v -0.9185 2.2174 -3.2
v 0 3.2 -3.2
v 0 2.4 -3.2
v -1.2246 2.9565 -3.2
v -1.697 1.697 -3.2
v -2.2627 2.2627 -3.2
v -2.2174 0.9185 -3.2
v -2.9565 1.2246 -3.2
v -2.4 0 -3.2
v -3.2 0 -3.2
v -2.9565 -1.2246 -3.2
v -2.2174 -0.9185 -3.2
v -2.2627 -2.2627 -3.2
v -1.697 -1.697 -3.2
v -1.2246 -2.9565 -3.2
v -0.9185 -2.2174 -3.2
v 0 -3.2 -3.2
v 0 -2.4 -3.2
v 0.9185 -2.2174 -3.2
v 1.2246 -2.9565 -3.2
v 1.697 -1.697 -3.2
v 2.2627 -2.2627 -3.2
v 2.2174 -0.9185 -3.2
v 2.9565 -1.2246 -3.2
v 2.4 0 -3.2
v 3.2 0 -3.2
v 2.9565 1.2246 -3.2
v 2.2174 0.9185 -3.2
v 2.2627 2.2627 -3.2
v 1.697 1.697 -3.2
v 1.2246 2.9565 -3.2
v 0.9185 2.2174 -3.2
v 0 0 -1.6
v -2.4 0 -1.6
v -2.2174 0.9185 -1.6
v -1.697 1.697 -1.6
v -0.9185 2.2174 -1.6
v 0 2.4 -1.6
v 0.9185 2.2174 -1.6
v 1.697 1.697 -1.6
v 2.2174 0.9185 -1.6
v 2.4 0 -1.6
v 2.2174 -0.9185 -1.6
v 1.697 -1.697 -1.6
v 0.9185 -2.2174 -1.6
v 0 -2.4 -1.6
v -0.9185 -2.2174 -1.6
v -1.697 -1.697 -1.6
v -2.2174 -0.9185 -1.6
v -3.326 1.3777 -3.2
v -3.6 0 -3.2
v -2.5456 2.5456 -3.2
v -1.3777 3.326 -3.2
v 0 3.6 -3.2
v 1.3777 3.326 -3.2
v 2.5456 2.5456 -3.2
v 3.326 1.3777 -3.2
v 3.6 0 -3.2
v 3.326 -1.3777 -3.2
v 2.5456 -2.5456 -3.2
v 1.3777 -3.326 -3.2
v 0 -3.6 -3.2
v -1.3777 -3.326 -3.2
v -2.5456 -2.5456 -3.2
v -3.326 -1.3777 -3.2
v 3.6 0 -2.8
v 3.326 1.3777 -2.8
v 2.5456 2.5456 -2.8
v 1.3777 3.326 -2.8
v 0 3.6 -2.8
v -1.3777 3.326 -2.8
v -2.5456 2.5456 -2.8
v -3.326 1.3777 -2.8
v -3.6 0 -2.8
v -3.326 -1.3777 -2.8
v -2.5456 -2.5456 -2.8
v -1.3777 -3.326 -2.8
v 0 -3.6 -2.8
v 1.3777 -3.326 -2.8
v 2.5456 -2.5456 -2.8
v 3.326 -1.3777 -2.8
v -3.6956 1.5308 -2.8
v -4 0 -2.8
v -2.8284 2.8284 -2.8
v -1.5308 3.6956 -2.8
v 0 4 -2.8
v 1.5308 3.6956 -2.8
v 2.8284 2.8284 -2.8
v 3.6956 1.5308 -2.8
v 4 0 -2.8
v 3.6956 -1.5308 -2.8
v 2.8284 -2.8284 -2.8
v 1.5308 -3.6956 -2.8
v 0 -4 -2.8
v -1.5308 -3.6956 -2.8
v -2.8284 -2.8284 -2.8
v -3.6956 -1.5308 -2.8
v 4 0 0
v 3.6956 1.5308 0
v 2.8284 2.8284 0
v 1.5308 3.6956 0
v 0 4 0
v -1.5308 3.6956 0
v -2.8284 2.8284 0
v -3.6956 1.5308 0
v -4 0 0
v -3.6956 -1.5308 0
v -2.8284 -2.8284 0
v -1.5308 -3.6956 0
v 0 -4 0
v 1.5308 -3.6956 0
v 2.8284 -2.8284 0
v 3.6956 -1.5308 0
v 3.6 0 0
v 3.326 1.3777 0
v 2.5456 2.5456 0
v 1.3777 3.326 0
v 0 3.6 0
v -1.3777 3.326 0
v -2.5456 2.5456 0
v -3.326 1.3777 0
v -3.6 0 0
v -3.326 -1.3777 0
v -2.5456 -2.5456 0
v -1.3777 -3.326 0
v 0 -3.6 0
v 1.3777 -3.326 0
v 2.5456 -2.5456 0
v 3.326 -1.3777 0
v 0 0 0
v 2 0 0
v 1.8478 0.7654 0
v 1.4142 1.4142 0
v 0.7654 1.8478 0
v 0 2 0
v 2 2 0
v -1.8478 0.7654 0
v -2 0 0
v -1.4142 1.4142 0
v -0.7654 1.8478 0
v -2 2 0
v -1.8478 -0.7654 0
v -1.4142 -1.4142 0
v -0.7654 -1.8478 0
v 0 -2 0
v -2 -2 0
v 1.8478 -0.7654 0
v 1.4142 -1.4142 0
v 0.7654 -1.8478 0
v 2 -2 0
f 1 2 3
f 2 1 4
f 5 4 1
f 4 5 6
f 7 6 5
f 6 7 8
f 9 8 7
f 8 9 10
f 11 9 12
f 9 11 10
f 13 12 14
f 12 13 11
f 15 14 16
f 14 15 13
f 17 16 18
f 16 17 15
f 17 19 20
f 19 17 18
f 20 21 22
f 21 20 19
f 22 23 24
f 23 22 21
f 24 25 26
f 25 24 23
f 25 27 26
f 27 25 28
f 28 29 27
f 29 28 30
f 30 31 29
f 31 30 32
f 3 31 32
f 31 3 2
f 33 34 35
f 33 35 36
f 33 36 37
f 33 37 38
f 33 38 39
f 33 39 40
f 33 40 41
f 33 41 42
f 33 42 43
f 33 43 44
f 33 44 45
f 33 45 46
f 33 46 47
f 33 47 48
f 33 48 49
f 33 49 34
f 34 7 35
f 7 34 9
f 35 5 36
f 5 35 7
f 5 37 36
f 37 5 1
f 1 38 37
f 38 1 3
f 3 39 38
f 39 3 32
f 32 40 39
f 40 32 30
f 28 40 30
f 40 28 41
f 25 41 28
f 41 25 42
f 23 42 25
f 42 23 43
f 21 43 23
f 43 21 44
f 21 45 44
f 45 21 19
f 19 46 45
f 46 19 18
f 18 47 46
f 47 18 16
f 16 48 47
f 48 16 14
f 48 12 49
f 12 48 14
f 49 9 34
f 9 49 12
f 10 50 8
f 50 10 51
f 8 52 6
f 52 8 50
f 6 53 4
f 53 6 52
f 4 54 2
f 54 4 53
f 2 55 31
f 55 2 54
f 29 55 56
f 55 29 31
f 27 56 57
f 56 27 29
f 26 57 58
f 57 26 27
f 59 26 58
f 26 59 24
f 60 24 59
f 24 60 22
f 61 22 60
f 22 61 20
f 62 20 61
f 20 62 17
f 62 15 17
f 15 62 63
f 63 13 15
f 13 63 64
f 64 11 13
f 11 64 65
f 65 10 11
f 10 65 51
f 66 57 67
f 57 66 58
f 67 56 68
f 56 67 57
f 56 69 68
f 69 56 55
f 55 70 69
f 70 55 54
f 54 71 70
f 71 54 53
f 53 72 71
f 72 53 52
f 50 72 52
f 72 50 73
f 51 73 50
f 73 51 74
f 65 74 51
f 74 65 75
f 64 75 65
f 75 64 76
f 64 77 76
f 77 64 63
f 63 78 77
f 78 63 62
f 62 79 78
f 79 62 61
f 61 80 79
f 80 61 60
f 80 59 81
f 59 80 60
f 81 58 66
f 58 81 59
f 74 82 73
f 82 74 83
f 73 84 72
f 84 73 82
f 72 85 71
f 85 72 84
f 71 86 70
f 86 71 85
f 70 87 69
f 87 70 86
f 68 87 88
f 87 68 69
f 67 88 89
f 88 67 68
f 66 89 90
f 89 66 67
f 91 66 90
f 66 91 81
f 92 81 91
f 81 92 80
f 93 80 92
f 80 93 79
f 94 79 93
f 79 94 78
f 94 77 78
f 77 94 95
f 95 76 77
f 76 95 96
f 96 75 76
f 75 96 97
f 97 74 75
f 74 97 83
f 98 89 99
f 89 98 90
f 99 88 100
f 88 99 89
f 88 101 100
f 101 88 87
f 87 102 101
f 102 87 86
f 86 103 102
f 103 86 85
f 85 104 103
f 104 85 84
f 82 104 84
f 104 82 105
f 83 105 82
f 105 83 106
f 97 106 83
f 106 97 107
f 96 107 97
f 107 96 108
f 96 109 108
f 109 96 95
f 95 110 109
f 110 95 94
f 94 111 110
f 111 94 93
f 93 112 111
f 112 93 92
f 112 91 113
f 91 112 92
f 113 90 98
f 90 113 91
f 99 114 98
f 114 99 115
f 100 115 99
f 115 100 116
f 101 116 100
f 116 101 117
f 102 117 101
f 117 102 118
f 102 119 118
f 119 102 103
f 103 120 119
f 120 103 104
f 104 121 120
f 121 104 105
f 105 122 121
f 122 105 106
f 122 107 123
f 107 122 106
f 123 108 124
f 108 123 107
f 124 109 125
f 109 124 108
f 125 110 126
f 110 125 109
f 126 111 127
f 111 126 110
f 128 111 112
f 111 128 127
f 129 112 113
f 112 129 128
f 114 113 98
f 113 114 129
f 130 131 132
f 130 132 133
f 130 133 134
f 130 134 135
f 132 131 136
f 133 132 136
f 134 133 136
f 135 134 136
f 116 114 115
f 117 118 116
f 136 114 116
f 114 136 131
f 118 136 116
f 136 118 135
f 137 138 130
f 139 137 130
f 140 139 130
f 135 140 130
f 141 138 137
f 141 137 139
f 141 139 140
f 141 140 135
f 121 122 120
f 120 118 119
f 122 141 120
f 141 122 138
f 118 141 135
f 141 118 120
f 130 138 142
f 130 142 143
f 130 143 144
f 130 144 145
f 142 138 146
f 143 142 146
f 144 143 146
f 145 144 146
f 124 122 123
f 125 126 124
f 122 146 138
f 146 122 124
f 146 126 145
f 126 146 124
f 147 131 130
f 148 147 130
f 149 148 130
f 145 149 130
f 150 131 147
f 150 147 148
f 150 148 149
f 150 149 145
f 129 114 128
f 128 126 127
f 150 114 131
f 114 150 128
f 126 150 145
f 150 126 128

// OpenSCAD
// file: ../p/4-4disc.scad
use <../lib.scad>
function ldraw_lib__4_4disc() = [
// 0 Disc 1.0
// 0 Name: 4-4disc.dat
// 0 Author: James Jessiman
// 0 !LDRAW_ORG Primitive UPDATE 2002-02
// 0 !LICENSE Licensed under CC BY 4.0 : see CAreadme.txt
// 
// 0 BFC CERTIFY CCW
  [0,"BFC","CERTIFY"],
  [0,"BFC","CCW"],
// 
// 0 !HISTORY 1998-12-15 [PTadmin] Official Update 1998-10
// 0 !HISTORY 2002-03-23 [sbliss] Added BFC statement
// 0 !HISTORY 2002-04-25 [PTadmin] Official Update 2002-02
// 0 !HISTORY 2007-06-24 [PTadmin] Header formatted for Contributor Agreement
// 0 !HISTORY 2008-07-01 [PTadmin] Official Update 2008-01
// 
// 
// 3 16 0 0 0 1 0 0 0.9239 0 0.3827
  [3,16,0,0,0,1,0,0,0.9239,0,0.3827],
// 3 16 0 0 0 0.9239 0 0.3827 0.7071 0 0.7071
  [3,16,0,0,0,0.9239,0,0.3827,0.7071,0,0.7071],
// 3 16 0 0 0 0.7071 0 0.7071 0.3827 0 0.9239
  [3,16,0,0,0,0.7071,0,0.7071,0.3827,0,0.9239],
// 3 16 0 0 0 0.3827 0 0.9239 0 0 1
  [3,16,0,0,0,0.3827,0,0.9239,0,0,1],
// 3 16 0 0 0 0 0 1 -0.3827 0 0.9239
  [3,16,0,0,0,0,0,1,-0.3827,0,0.9239],
// 3 16 0 0 0 -0.3827 0 0.9239 -0.7071 0 0.7071
  [3,16,0,0,0,-0.3827,0,0.9239,-0.7071,0,0.7071],
// 3 16 0 0 0 -0.7071 0 0.7071 -0.9239 0 0.3827
  [3,16,0,0,0,-0.7071,0,0.7071,-0.9239,0,0.3827],
// 3 16 0 0 0 -0.9239 0 0.3827 -1 0 -0
  [3,16,0,0,0,-0.9239,0,0.3827,-1,0,-0],
// 3 16 0 0 0 -1 0 -0 -0.9239 0 -0.3827
  [3,16,0,0,0,-1,0,-0,-0.9239,0,-0.3827],
// 3 16 0 0 0 -0.9239 0 -0.3827 -0.7071 0 -0.7071
  [3,16,0,0,0,-0.9239,0,-0.3827,-0.7071,0,-0.7071],
// 3 16 0 0 0 -0.7071 0 -0.7071 -0.3827 0 -0.9239
  [3,16,0,0,0,-0.7071,0,-0.7071,-0.3827,0,-0.9239],
// 3 16 0 0 0 -0.3827 0 -0.9239 0 0 -1
  [3,16,0,0,0,-0.3827,0,-0.9239,0,0,-1],
// 3 16 0 0 0 0 0 -1 0.3827 0 -0.9239
  [3,16,0,0,0,0,0,-1,0.3827,0,-0.9239],
// 3 16 0 0 0 0.3827 0 -0.9239 0.7071 0 -0.7071
  [3,16,0,0,0,0.3827,0,-0.9239,0.7071,0,-0.7071],
// 3 16 0 0 0 0.7071 0 -0.7071 0.9239 0 -0.3827
  [3,16,0,0,0,0.7071,0,-0.7071,0.9239,0,-0.3827],
// 3 16 0 0 0 0.9239 0 -0.3827 1 0 0
  [3,16,0,0,0,0.9239,0,-0.3827,1,0,0],
// 0
];
module ldraw_lib__4_4disc(step=0, col=false, unit=2/5, alt=false, line=0.2, solid=!$preview)
    makepoly(ldraw_lib__4_4disc(), step=step, col=col, unit=unit, alt=alt, line=line, solid=solid);
ldraw_lib__4_4disc(line=0.2);
// file: ../p/4-4ring3.scad
use <../lib.scad>
function ldraw_lib__4_4ring3() = [
// 0 Ring  3 x 1.0
// 0 Name: 4-4ring3.dat
// 0 Author: James Jessiman
// 0 !LDRAW_ORG Primitive UPDATE 2009-01
// 0 !LICENSE Licensed under CC BY 4.0 : see CAreadme.txt
// 
// 0 BFC CERTIFY CCW
  [0,"BFC","CERTIFY"],
  [0,"BFC","CCW"],
// 
// 0 !HISTORY 1998-12-15 [PTadmin] Official Update 1998-10
// 0 !HISTORY 2002-04-05 [hafhead] Added BFC statement
// 0 !HISTORY 2002-04-25 [PTadmin] Official Update 2002-02
// 0 !HISTORY 2007-06-24 [PTadmin] Header formatted for Contributor Agreement
// 0 !HISTORY 2008-07-01 [PTadmin] Official Update 2008-01
// 0 !HISTORY 2008-08-26 [cwdee] Switch polygon winding and rename
// 0 !HISTORY 2009-05-02 [PTadmin] Official Update 2009-01
// 
// 
// 4 16 -1.5308 0 3.6956 -1.1481 0 2.7717 0 0 3 0 0 4
  [4,16,-1.5308,0,3.6956,-1.1481,0,2.7717,0,0,3,0,0,4],
// 4 16 -2.8284 0 2.8284 -2.1213 0 2.1213 -1.1481 0 2.7717 -1.5308 0 3.6956
  [4,16,-2.8284,0,2.8284,-2.1213,0,2.1213,-1.1481,0,2.7717,-1.5308,0,3.6956],
// 4 16 -3.6956 0 1.5308 -2.7717 0 1.1481 -2.1213 0 2.1213 -2.8284 0 2.8284
  [4,16,-3.6956,0,1.5308,-2.7717,0,1.1481,-2.1213,0,2.1213,-2.8284,0,2.8284],
// 4 16 -4 0 0 -3 0 0 -2.7717 0 1.1481 -3.6956 0 1.5308
  [4,16,-4,0,0,-3,0,0,-2.7717,0,1.1481,-3.6956,0,1.5308],
// 4 16 -3.6956 0 -1.5308 -2.7717 0 -1.1481 -3 0 0 -4 0 0
  [4,16,-3.6956,0,-1.5308,-2.7717,0,-1.1481,-3,0,0,-4,0,0],
// 4 16 -2.8284 0 -2.8284 -2.1213 0 -2.1213 -2.7717 0 -1.1481 -3.6956 0 -1.5308
  [4,16,-2.8284,0,-2.8284,-2.1213,0,-2.1213,-2.7717,0,-1.1481,-3.6956,0,-1.5308],
// 4 16 -1.5308 0 -3.6956 -1.1481 0 -2.7717 -2.1213 0 -2.1213 -2.8284 0 -2.8284
  [4,16,-1.5308,0,-3.6956,-1.1481,0,-2.7717,-2.1213,0,-2.1213,-2.8284,0,-2.8284],
// 4 16 0 0 -4 0 0 -3 -1.1481 0 -2.7717 -1.5308 0 -3.6956
  [4,16,0,0,-4,0,0,-3,-1.1481,0,-2.7717,-1.5308,0,-3.6956],
// 4 16 1.5308 0 -3.6956 1.1481 0 -2.7717 0 0 -3 0 0 -4
  [4,16,1.5308,0,-3.6956,1.1481,0,-2.7717,0,0,-3,0,0,-4],
// 4 16 2.8284 0 -2.8284 2.1213 0 -2.1213 1.1481 0 -2.7717 1.5308 0 -3.6956
  [4,16,2.8284,0,-2.8284,2.1213,0,-2.1213,1.1481,0,-2.7717,1.5308,0,-3.6956],
// 4 16 3.6956 0 -1.5308 2.7717 0 -1.1481 2.1213 0 -2.1213 2.8284 0 -2.8284
  [4,16,3.6956,0,-1.5308,2.7717,0,-1.1481,2.1213,0,-2.1213,2.8284,0,-2.8284],
// 4 16 4 0 0 3 0 0 2.7717 0 -1.1481 3.6956 0 -1.5308
  [4,16,4,0,0,3,0,0,2.7717,0,-1.1481,3.6956,0,-1.5308],
// 4 16 3.6956 0 1.5308 2.7717 0 1.1481 3 0 0 4 0 0
  [4,16,3.6956,0,1.5308,2.7717,0,1.1481,3,0,0,4,0,0],
// 4 16 2.8284 0 2.8284 2.1213 0 2.1213 2.7717 0 1.1481 3.6956 0 1.5308
  [4,16,2.8284,0,2.8284,2.1213,0,2.1213,2.7717,0,1.1481,3.6956,0,1.5308],
// 4 16 1.5308 0 3.6956 1.1481 0 2.7717 2.1213 0 2.1213 2.8284 0 2.8284
  [4,16,1.5308,0,3.6956,1.1481,0,2.7717,2.1213,0,2.1213,2.8284,0,2.8284],
// 4 16 0 0 4 0 0 3 1.1481 0 2.7717 1.5308 0 3.6956
  [4,16,0,0,4,0,0,3,1.1481,0,2.7717,1.5308,0,3.6956],
// 0
];
module ldraw_lib__4_4ring3(step=0, col=false, unit=2/5, alt=false, line=0.2, solid=!$preview)
    makepoly(ldraw_lib__4_4ring3(), step=step, col=col, unit=unit, alt=alt, line=line, solid=solid);
ldraw_lib__4_4ring3(line=0.2);
// file: ../p/4-4cylc.scad
use <../lib.scad>
use <4-4cyli.scad>
use <4-4disc.scad>
use <4-4edge.scad>
function ldraw_lib__4_4cylc() = [
// 0 Cylinder Closed 1.0
// 0 Name: 4-4cylc.dat
// 0 Author: Alex Taylor [anathema]
// 0 !LDRAW_ORG Primitive UPDATE 2009-02
// 0 !LICENSE Licensed under CC BY 4.0 : see CAreadme.txt
// 
// 0 BFC CERTIFY CCW
  [0,"BFC","CERTIFY"],
  [0,"BFC","CCW"],
// 
// 0 !HISTORY 2008-12-29 [cwdee] Removed one disc
// 0 !HISTORY 2009-09-03 [PTadmin] Official Update 2009-02
// 
// 
// 1 16 0 0 0 1 0 0 0 1 0 0 0 1 4-4edge.dat
  [1,16,0,0,0,1,0,0,0,1,0,0,0,1, ldraw_lib__4_4edge()],
// 1 16 0 1 0 1 0 0 0 1 0 0 0 1 4-4edge.dat
  [1,16,0,1,0,1,0,0,0,1,0,0,0,1, ldraw_lib__4_4edge()],
// 1 16 0 0 0 1 0 0 0 1 0 0 0 1 4-4disc.dat
  [1,16,0,0,0,1,0,0,0,1,0,0,0,1, ldraw_lib__4_4disc()],
// 1 16 0 0 0 1 0 0 0 1 0 0 0 1 4-4cyli.dat
  [1,16,0,0,0,1,0,0,0,1,0,0,0,1, ldraw_lib__4_4cyli()],
// 0
];
module ldraw_lib__4_4cylc(step=0, col=false, unit=2/5, alt=false, line=0.2, solid=!$preview)
    makepoly(ldraw_lib__4_4cylc(), step=step, col=col, unit=unit, alt=alt, line=line, solid=solid);
ldraw_lib__4_4cylc(line=0.2);
// file: ../p/4-4edge.scad
use <../lib.scad>
function ldraw_lib__4_4edge() = [
// 0 Circle 1.0
// 0 Name: 4-4edge.dat
// 0 Author: James Jessiman
// 0 !LDRAW_ORG Primitive UPDATE 2017-01
// 0 !LICENSE Licensed under CC BY 4.0 : see CAreadme.txt
// 
// 0 BFC CERTIFY CCW
  [0,"BFC","CERTIFY"],
  [0,"BFC","CCW"],
// 
// 0 !HISTORY 1998-12-15 [PTadmin] Official Update 1998-10
// 0 !HISTORY 2005-12-28 [PTadmin] Official Update 2005-01
// 0 !HISTORY 2007-06-24 [PTadmin] Header formatted for Contributor Agreement
// 0 !HISTORY 2008-07-01 [PTadmin] Official Update 2008-01
// 0 !HISTORY 2017-01-15 [Steffen] BFCed
// 0 !HISTORY 2017-12-30 [PTadmin] Official Update 2017-01
// 
// 
// 2 24 1 0 0 0.9239 0 0.3827
  [2,24,1,0,0,0.9239,0,0.3827],
// 2 24 0.9239 0 0.3827 0.7071 0 0.7071
  [2,24,0.9239,0,0.3827,0.7071,0,0.7071],
// 2 24 0.7071 0 0.7071 0.3827 0 0.9239
  [2,24,0.7071,0,0.7071,0.3827,0,0.9239],
// 2 24 0.3827 0 0.9239 0 0 1
  [2,24,0.3827,0,0.9239,0,0,1],
// 2 24 0 0 1 -0.3827 0 0.9239
  [2,24,0,0,1,-0.3827,0,0.9239],
// 2 24 -0.3827 0 0.9239 -0.7071 0 0.7071
  [2,24,-0.3827,0,0.9239,-0.7071,0,0.7071],
// 2 24 -0.7071 0 0.7071 -0.9239 0 0.3827
  [2,24,-0.7071,0,0.7071,-0.9239,0,0.3827],
// 2 24 -0.9239 0 0.3827 -1 0 -0
  [2,24,-0.9239,0,0.3827,-1,0,-0],
// 2 24 -1 0 -0 -0.9239 0 -0.3827
  [2,24,-1,0,-0,-0.9239,0,-0.3827],
// 2 24 -0.9239 0 -0.3827 -0.7071 0 -0.7071
  [2,24,-0.9239,0,-0.3827,-0.7071,0,-0.7071],
// 2 24 -0.7071 0 -0.7071 -0.3827 0 -0.9239
  [2,24,-0.7071,0,-0.7071,-0.3827,0,-0.9239],
// 2 24 -0.3827 0 -0.9239 0 0 -1
  [2,24,-0.3827,0,-0.9239,0,0,-1],
// 2 24 0 0 -1 0.3827 0 -0.9239
  [2,24,0,0,-1,0.3827,0,-0.9239],
// 2 24 0.3827 0 -0.9239 0.7071 0 -0.7071
  [2,24,0.3827,0,-0.9239,0.7071,0,-0.7071],
// 2 24 0.7071 0 -0.7071 0.9239 0 -0.3827
  [2,24,0.7071,0,-0.7071,0.9239,0,-0.3827],
// 2 24 0.9239 0 -0.3827 1 0 0
  [2,24,0.9239,0,-0.3827,1,0,0],
];
module ldraw_lib__4_4edge(step=0, col=false, unit=2/5, alt=false, line=0.2, solid=!$preview)
    makepoly(ldraw_lib__4_4edge(), step=step, col=col, unit=unit, alt=alt, line=line, solid=solid);
ldraw_lib__4_4edge(line=0.2);
// file: ../p/4-4cyli.scad
use <../lib.scad>
function ldraw_lib__4_4cyli() = [
// 0 Cylinder 1.0
// 0 Name: 4-4cyli.dat
// 0 Author: James Jessiman
// 0 !LDRAW_ORG Primitive UPDATE 2005-01
// 0 !LICENSE Licensed under CC BY 4.0 : see CAreadme.txt
// 
// 0 BFC CERTIFY CCW
  [0,"BFC","CERTIFY"],
  [0,"BFC","CCW"],
// 
// 0 !HISTORY 1998-12-15 [PTadmin] Official Update 1998-10
// 0 !HISTORY 2002-03-23 [sbliss] Added BFC statement; merged headers from files in distributions LDraw 0.27 and Complete.
// 0 !HISTORY 2002-04-25 [PTadmin] Official Update 2002-02
// 0 !HISTORY 2004-12-14 [guyvivan] BFC CCW
// 0 !HISTORY 2005-12-28 [PTadmin] Official Update 2005-01
// 0 !HISTORY 2007-06-24 [PTadmin] Header formatted for Contributor Agreement
// 0 !HISTORY 2008-07-01 [PTadmin] Official Update 2008-01
// 
// 
// 4 16 1 1 0 0.9239 1 0.3827 0.9239 0 0.3827 1 0 0
  [4,16,1,1,0,0.9239,1,0.3827,0.9239,0,0.3827,1,0,0],
// 5 24 1 0 0 1 1 0 0.9239 0 0.3827 0.9239 0 -0.3827
  [5,24,1,0,0,1,1,0,0.9239,0,0.3827,0.9239,0,-0.3827],
// 4 16 0.9239 1 0.3827 0.7071 1 0.7071 0.7071 0 0.7071 0.9239 0 0.3827
  [4,16,0.9239,1,0.3827,0.7071,1,0.7071,0.7071,0,0.7071,0.9239,0,0.3827],
// 5 24 0.9239 0 0.3827 0.9239 1 0.3827 0.7071 0 0.7071 1 0 0
  [5,24,0.9239,0,0.3827,0.9239,1,0.3827,0.7071,0,0.7071,1,0,0],
// 4 16 0.7071 1 0.7071 0.3827 1 0.9239 0.3827 0 0.9239 0.7071 0 0.7071
  [4,16,0.7071,1,0.7071,0.3827,1,0.9239,0.3827,0,0.9239,0.7071,0,0.7071],
// 5 24 0.7071 0 0.7071 0.7071 1 0.7071 0.3827 0 0.9239 0.9239 0 0.3827
  [5,24,0.7071,0,0.7071,0.7071,1,0.7071,0.3827,0,0.9239,0.9239,0,0.3827],
// 4 16 0.3827 1 0.9239 0 1 1 0 0 1 0.3827 0 0.9239
  [4,16,0.3827,1,0.9239,0,1,1,0,0,1,0.3827,0,0.9239],
// 5 24 0.3827 0 0.9239 0.3827 1 0.9239 0 0 1 0.7071 0 0.7071
  [5,24,0.3827,0,0.9239,0.3827,1,0.9239,0,0,1,0.7071,0,0.7071],
// 4 16 0 1 1 -0.3827 1 0.9239 -0.3827 0 0.9239 0 0 1
  [4,16,0,1,1,-0.3827,1,0.9239,-0.3827,0,0.9239,0,0,1],
// 5 24 0 0 1 0 1 1 -0.3827 0 0.9239 0.3827 0 0.9239
  [5,24,0,0,1,0,1,1,-0.3827,0,0.9239,0.3827,0,0.9239],
// 4 16 -0.3827 1 0.9239 -0.7071 1 0.7071 -0.7071 0 0.7071 -0.3827 0 0.9239
  [4,16,-0.3827,1,0.9239,-0.7071,1,0.7071,-0.7071,0,0.7071,-0.3827,0,0.9239],
// 5 24 -0.3827 0 0.9239 -0.3827 1 0.9239 -0.7071 0 0.7071 0 0 1
  [5,24,-0.3827,0,0.9239,-0.3827,1,0.9239,-0.7071,0,0.7071,0,0,1],
// 4 16 -0.7071 1 0.7071 -0.9239 1 0.3827 -0.9239 0 0.3827 -0.7071 0 0.7071
  [4,16,-0.7071,1,0.7071,-0.9239,1,0.3827,-0.9239,0,0.3827,-0.7071,0,0.7071],
// 5 24 -0.7071 0 0.7071 -0.7071 1 0.7071 -0.9239 0 0.3827 -0.3827 0 0.9239
  [5,24,-0.7071,0,0.7071,-0.7071,1,0.7071,-0.9239,0,0.3827,-0.3827,0,0.9239],
// 4 16 -0.9239 1 0.3827 -1 1 0 -1 0 0 -0.9239 0 0.3827
  [4,16,-0.9239,1,0.3827,-1,1,0,-1,0,0,-0.9239,0,0.3827],
// 5 24 -0.9239 0 0.3827 -0.9239 1 0.3827 -1 0 0 -0.7071 0 0.7071
  [5,24,-0.9239,0,0.3827,-0.9239,1,0.3827,-1,0,0,-0.7071,0,0.7071],
// 4 16 -1 1 0 -0.9239 1 -0.3827 -0.9239 0 -0.3827 -1 0 0
  [4,16,-1,1,0,-0.9239,1,-0.3827,-0.9239,0,-0.3827,-1,0,0],
// 5 24 -1 0 0 -1 1 0 -0.9239 0 -0.3827 -0.9239 0 0.3827
  [5,24,-1,0,0,-1,1,0,-0.9239,0,-0.3827,-0.9239,0,0.3827],
// 4 16 -0.9239 1 -0.3827 -0.7071 1 -0.7071 -0.7071 0 -0.7071 -0.9239 0 -0.3827
  [4,16,-0.9239,1,-0.3827,-0.7071,1,-0.7071,-0.7071,0,-0.7071,-0.9239,0,-0.3827],
// 5 24 -0.9239 0 -0.3827 -0.9239 1 -0.3827 -0.7071 0 -0.7071 -1 0 0
  [5,24,-0.9239,0,-0.3827,-0.9239,1,-0.3827,-0.7071,0,-0.7071,-1,0,0],
// 4 16 -0.7071 1 -0.7071 -0.3827 1 -0.9239 -0.3827 0 -0.9239 -0.7071 0 -0.7071
  [4,16,-0.7071,1,-0.7071,-0.3827,1,-0.9239,-0.3827,0,-0.9239,-0.7071,0,-0.7071],
// 5 24 -0.7071 0 -0.7071 -0.7071 1 -0.7071 -0.3827 0 -0.9239 -0.9239 0 -0.3827
  [5,24,-0.7071,0,-0.7071,-0.7071,1,-0.7071,-0.3827,0,-0.9239,-0.9239,0,-0.3827],
// 4 16 -0.3827 1 -0.9239 0 1 -1 0 0 -1 -0.3827 0 -0.9239
  [4,16,-0.3827,1,-0.9239,0,1,-1,0,0,-1,-0.3827,0,-0.9239],
// 5 24 -0.3827 0 -0.9239 -0.3827 1 -0.9239 0 0 -1 -0.7071 0 -0.7071
  [5,24,-0.3827,0,-0.9239,-0.3827,1,-0.9239,0,0,-1,-0.7071,0,-0.7071],
// 4 16 0 1 -1 0.3827 1 -0.9239 0.3827 0 -0.9239 0 0 -1
  [4,16,0,1,-1,0.3827,1,-0.9239,0.3827,0,-0.9239,0,0,-1],
// 5 24 0 0 -1 0 1 -1 0.3827 0 -0.9239 -0.3827 0 -0.9239
  [5,24,0,0,-1,0,1,-1,0.3827,0,-0.9239,-0.3827,0,-0.9239],
// 4 16 0.3827 1 -0.9239 0.7071 1 -0.7071 0.7071 0 -0.7071 0.3827 0 -0.9239
  [4,16,0.3827,1,-0.9239,0.7071,1,-0.7071,0.7071,0,-0.7071,0.3827,0,-0.9239],
// 5 24 0.3827 0 -0.9239 0.3827 1 -0.9239 0.7071 0 -0.7071 0 0 -1
  [5,24,0.3827,0,-0.9239,0.3827,1,-0.9239,0.7071,0,-0.7071,0,0,-1],
// 4 16 0.7071 1 -0.7071 0.9239 1 -0.3827 0.9239 0 -0.3827 0.7071 0 -0.7071
  [4,16,0.7071,1,-0.7071,0.9239,1,-0.3827,0.9239,0,-0.3827,0.7071,0,-0.7071],
// 5 24 0.7071 0 -0.7071 0.7071 1 -0.7071 0.9239 0 -0.3827 0.3827 0 -0.9239
  [5,24,0.7071,0,-0.7071,0.7071,1,-0.7071,0.9239,0,-0.3827,0.3827,0,-0.9239],
// 4 16 0.9239 1 -0.3827 1 1 0 1 0 0 0.9239 0 -0.3827
  [4,16,0.9239,1,-0.3827,1,1,0,1,0,0,0.9239,0,-0.3827],
// 5 24 0.9239 0 -0.3827 0.9239 1 -0.3827 1 0 0 0.7071 0 -0.7071
  [5,24,0.9239,0,-0.3827,0.9239,1,-0.3827,1,0,0,0.7071,0,-0.7071],
// 0
];
module ldraw_lib__4_4cyli(step=0, col=false, unit=2/5, alt=false, line=0.2, solid=!$preview)
    makepoly(ldraw_lib__4_4cyli(), step=step, col=col, unit=unit, alt=alt, line=line, solid=solid);
ldraw_lib__4_4cyli(line=0.2);
// file: ../p/stud4o.scad
use <../lib.scad>
use <4-4cylc.scad>
use <4-4ring3.scad>
function ldraw_lib__stud4o() = [
// 0 Stud Tube Open without Outer Cylinder
// 0 Name: stud4o.dat
// 0 Author: Magnus Forsberg [MagFors]
// 0 !LDRAW_ORG Primitive UPDATE 2011-02
// 0 !LICENSE Licensed under CC BY 4.0 : see CAreadme.txt
// 
// 0 !HELP This stud is a "antistud" to be used like a underside stud,
// 0 !HELP but without the outer cylinder.
// 0 !HELP 1 47 0 0 0 1 0 0 0 1 0 0 0 1 stud4.dat
// 
// 0 BFC CERTIFY CCW
  [0,"BFC","CERTIFY"],
  [0,"BFC","CCW"],
// 
// 0 !HISTORY 2011-12-29 [PTadmin] Official Update 2011-02
// 
// 
// 1 16 0 -4 0 2 0 0 0 1 0 0 0 2 4-4ring3.dat
  [1,16,0,-4,0,2,0,0,0,1,0,0,0,2, ldraw_lib__4_4ring3()],
// 0 BFC INVERTNEXT
  [0,"BFC","INVERTNEXT"],
// 1 16 0 0 0 -6 0 0 0 -4 0 0 0 6 4-4cylc.dat
  [1,16,0,0,0,-6,0,0,0,-4,0,0,0,6, ldraw_lib__4_4cylc()],
];
module ldraw_lib__stud4o(step=0, col=false, unit=2/5, alt=false, line=0.2, solid=!$preview)
    makepoly(ldraw_lib__stud4o(), step=step, col=col, unit=unit, alt=alt, line=line, solid=solid);
ldraw_lib__stud4o(line=0.2);
// file: ../p/4-4ring8.scad
use <../lib.scad>
function ldraw_lib__4_4ring8() = [
// 0 Ring  8 x 1.0
// 0 Name: 4-4ring8.dat
// 0 Author: Steffen [Steffen]
// 0 !LDRAW_ORG Primitive UPDATE 2012-01
// 0 !LICENSE Licensed under CC BY 4.0 : see CAreadme.txt
// 
// 0 BFC CERTIFY CCW
  [0,"BFC","CERTIFY"],
  [0,"BFC","CCW"],
// 
// 0 !HISTORY 2003-12-19 [PTadmin] Official Update 2003-03
// 0 !HISTORY 2007-06-24 [PTadmin] Header formatted for Contributor Agreement
// 0 !HISTORY 2008-07-01 [PTadmin] Official Update 2008-01
// 0 !HISTORY 2012-02-16 [Philo] Changed to CCW
// 0 !HISTORY 2012-03-30 [PTadmin] Official Update 2012-01
// 
// 
// 4 16 9 0 0 8.3151 0 3.4443 7.3912 0 3.0616 8 0 0
  [4,16,9,0,0,8.3151,0,3.4443,7.3912,0,3.0616,8,0,0],
// 4 16 8.3151 0 3.4443 6.3639 0 6.3639 5.6568 0 5.6568 7.3912 0 3.0616
  [4,16,8.3151,0,3.4443,6.3639,0,6.3639,5.6568,0,5.6568,7.3912,0,3.0616],
// 4 16 6.3639 0 6.3639 3.4443 0 8.3151 3.0616 0 7.3912 5.6568 0 5.6568
  [4,16,6.3639,0,6.3639,3.4443,0,8.3151,3.0616,0,7.3912,5.6568,0,5.6568],
// 4 16 3.4443 0 8.3151 0 0 9 0 0 8 3.0616 0 7.3912
  [4,16,3.4443,0,8.3151,0,0,9,0,0,8,3.0616,0,7.3912],
// 4 16 0 0 9 -3.4443 0 8.3151 -3.0616 0 7.3912 0 0 8
  [4,16,0,0,9,-3.4443,0,8.3151,-3.0616,0,7.3912,0,0,8],
// 4 16 -3.4443 0 8.3151 -6.3639 0 6.3639 -5.6568 0 5.6568 -3.0616 0 7.3912
  [4,16,-3.4443,0,8.3151,-6.3639,0,6.3639,-5.6568,0,5.6568,-3.0616,0,7.3912],
// 4 16 -6.3639 0 6.3639 -8.3151 0 3.4443 -7.3912 0 3.0616 -5.6568 0 5.6568
  [4,16,-6.3639,0,6.3639,-8.3151,0,3.4443,-7.3912,0,3.0616,-5.6568,0,5.6568],
// 4 16 -8.3151 0 3.4443 -9 0 0 -8 0 0 -7.3912 0 3.0616
  [4,16,-8.3151,0,3.4443,-9,0,0,-8,0,0,-7.3912,0,3.0616],
// 4 16 -9 0 0 -8.3151 0 -3.4443 -7.3912 0 -3.0616 -8 0 0
  [4,16,-9,0,0,-8.3151,0,-3.4443,-7.3912,0,-3.0616,-8,0,0],
// 4 16 -8.3151 0 -3.4443 -6.3639 0 -6.3639 -5.6568 0 -5.6568 -7.3912 0 -3.0616
  [4,16,-8.3151,0,-3.4443,-6.3639,0,-6.3639,-5.6568,0,-5.6568,-7.3912,0,-3.0616],
// 4 16 -6.3639 0 -6.3639 -3.4443 0 -8.3151 -3.0616 0 -7.3912 -5.6568 0 -5.6568
  [4,16,-6.3639,0,-6.3639,-3.4443,0,-8.3151,-3.0616,0,-7.3912,-5.6568,0,-5.6568],
// 4 16 -3.4443 0 -8.3151 0 0 -9 0 0 -8 -3.0616 0 -7.3912
  [4,16,-3.4443,0,-8.3151,0,0,-9,0,0,-8,-3.0616,0,-7.3912],
// 4 16 0 0 -9 3.4443 0 -8.3151 3.0616 0 -7.3912 0 0 -8
  [4,16,0,0,-9,3.4443,0,-8.3151,3.0616,0,-7.3912,0,0,-8],
// 4 16 3.4443 0 -8.3151 6.3639 0 -6.3639 5.6568 0 -5.6568 3.0616 0 -7.3912
  [4,16,3.4443,0,-8.3151,6.3639,0,-6.3639,5.6568,0,-5.6568,3.0616,0,-7.3912],
// 4 16 6.3639 0 -6.3639 8.3151 0 -3.4443 7.3912 0 -3.0616 5.6568 0 -5.6568
  [4,16,6.3639,0,-6.3639,8.3151,0,-3.4443,7.3912,0,-3.0616,5.6568,0,-5.6568],
// 4 16 8.3151 0 -3.4443 9 0 0 8 0 0 7.3912 0 -3.0616
  [4,16,8.3151,0,-3.4443,9,0,0,8,0,0,7.3912,0,-3.0616],
];
module ldraw_lib__4_4ring8(step=0, col=false, unit=2/5, alt=false, line=0.2, solid=!$preview)
    makepoly(ldraw_lib__4_4ring8(), step=step, col=col, unit=unit, alt=alt, line=line, solid=solid);
ldraw_lib__4_4ring8(line=0.2);
// file: ../p/4-4cylo.scad
use <../lib.scad>
use <4-4cyli.scad>
use <4-4edge.scad>
function ldraw_lib__4_4cylo() = [
// 0 Cylinder Open 1.0
// 0 Name: 4-4cylo.dat
// 0 Author: Mark Kennedy [mkennedy]
// 0 !LDRAW_ORG Primitive UPDATE 2010-01
// 0 !LICENSE Licensed under CC BY 4.0 : see CAreadme.txt
// 
// 0 BFC CERTIFY CCW
  [0,"BFC","CERTIFY"],
  [0,"BFC","CCW"],
// 
// 0 !HISTORY 2010-04-05 [PTadmin] Official Update 2010-01
// 
// 
// 1 16 0 0 0 1 0 0 0 1 0 0 0 1 4-4edge.dat
  [1,16,0,0,0,1,0,0,0,1,0,0,0,1, ldraw_lib__4_4edge()],
// 1 16 0 1 0 1 0 0 0 1 0 0 0 1 4-4edge.dat
  [1,16,0,1,0,1,0,0,0,1,0,0,0,1, ldraw_lib__4_4edge()],
// 1 16 0 0 0 1 0 0 0 1 0 0 0 1 4-4cyli.dat
  [1,16,0,0,0,1,0,0,0,1,0,0,0,1, ldraw_lib__4_4cyli()],
// 0
];
module ldraw_lib__4_4cylo(step=0, col=false, unit=2/5, alt=false, line=0.2, solid=!$preview)
    makepoly(ldraw_lib__4_4cylo(), step=step, col=col, unit=unit, alt=alt, line=line, solid=solid);
ldraw_lib__4_4cylo(line=0.2);
// file: s/98138s02.scad
use <../../lib.scad>
use <../../p/4-4cylo.scad>
use <../../p/4-4ring8.scad>
use <../../p/4-4ring9.scad>
use <../../p/stud4o.scad>
function ldraw_lib__s__98138s02() = [
// 0 ~Tile  1 x  1 Round with Groove without Complete Top Face
// 0 Name: s\98138s02.dat
// 0 Author: Magnus Forsberg [MagFors]
// 0 !LDRAW_ORG Subpart UPDATE 2020-01
// 0 !LICENSE Licensed under CC BY 4.0 : see CAreadme.txt
// 
// 0 BFC CERTIFY CCW
  [0,"BFC","CERTIFY"],
  [0,"BFC","CCW"],
// 
// 0 !HISTORY 2020-06-28 [PTadmin] Official Update 2020-01
// 
// 
// 1 16 0 4 0 1 0 0 0 -1 0 0 0 1 stud4o.dat
  [1,16,0,4,0,1,0,0,0,-1,0,0,0,1, ldraw_lib__stud4o()],
// 1 16 0 8 0 -1 0 0 0 -1 0 0 0 1 4-4ring8.dat
  [1,16,0,8,0,-1,0,0,0,-1,0,0,0,1, ldraw_lib__4_4ring8()],
// 1 16 0 7 0 9 0 0 0 1 0 0 0 9 4-4cylo.dat
  [1,16,0,7,0,9,0,0,0,1,0,0,0,9, ldraw_lib__4_4cylo()],
// 1 16 0 7 0 -1 0 0 0 -1 0 0 0 1 4-4ring9.dat
  [1,16,0,7,0,-1,0,0,0,-1,0,0,0,1, ldraw_lib__4_4ring9()],
// 1 16 0 0 0 10 0 0 0 7 0 0 0 10 4-4cylo.dat
  [1,16,0,0,0,10,0,0,0,7,0,0,0,10, ldraw_lib__4_4cylo()],
];
module ldraw_lib__s__98138s02(step=0, col=false, unit=2/5, alt=false, line=0.2, solid=!$preview)
    makepoly(ldraw_lib__s__98138s02(), step=step, col=col, unit=unit, alt=alt, line=line, solid=solid);
ldraw_lib__s__98138s02(line=0.2);
// file: ../p/4-4ring9.scad
use <../lib.scad>
function ldraw_lib__4_4ring9() = [
// 0 Ring  9 x 1.0
// 0 Name: 4-4ring9.dat
// 0 Author: Magnus Forsberg [MagFors]
// 0 !LDRAW_ORG Primitive UPDATE 2024-01
// 0 !LICENSE Licensed under CC BY 4.0 : see CAreadme.txt
// 
// 0 BFC CERTIFY CCW
  [0,"BFC","CERTIFY"],
  [0,"BFC","CCW"],
// 
// 0 !HISTORY 2004-04-22 [PTadmin] Official Update 2004-02
// 0 !HISTORY 2007-06-24 [PTadmin] Header formatted for Contributor Agreement
// 0 !HISTORY 2008-07-01 [PTadmin] Official Update 2008-01
// 0 !HISTORY 2024-01-04 [MagFors] Complete regeneration, original by jriley
// 0 !HISTORY 2024-01-29 [OrionP] Official Update 2024-01
// 
// 4 16 10 0 0 9.239 0 3.827 8.3151 0 3.4443 9 0 0
  [4,16,10,0,0,9.239,0,3.827,8.3151,0,3.4443,9,0,0],
// 4 16 9.239 0 3.827 7.071 0 7.071 6.3639 0 6.3639 8.3151 0 3.4443
  [4,16,9.239,0,3.827,7.071,0,7.071,6.3639,0,6.3639,8.3151,0,3.4443],
// 4 16 7.071 0 7.071 3.827 0 9.239 3.4443 0 8.3151 6.3639 0 6.3639
  [4,16,7.071,0,7.071,3.827,0,9.239,3.4443,0,8.3151,6.3639,0,6.3639],
// 4 16 3.827 0 9.239 0 0 10 0 0 9 3.4443 0 8.3151
  [4,16,3.827,0,9.239,0,0,10,0,0,9,3.4443,0,8.3151],
// 4 16 0 0 10 -3.827 0 9.239 -3.4443 0 8.3151 0 0 9
  [4,16,0,0,10,-3.827,0,9.239,-3.4443,0,8.3151,0,0,9],
// 4 16 -3.827 0 9.239 -7.071 0 7.071 -6.3639 0 6.3639 -3.4443 0 8.3151
  [4,16,-3.827,0,9.239,-7.071,0,7.071,-6.3639,0,6.3639,-3.4443,0,8.3151],
// 4 16 -7.071 0 7.071 -9.239 0 3.827 -8.3151 0 3.4443 -6.3639 0 6.3639
  [4,16,-7.071,0,7.071,-9.239,0,3.827,-8.3151,0,3.4443,-6.3639,0,6.3639],
// 4 16 -9.239 0 3.827 -10 0 0 -9 0 0 -8.3151 0 3.4443
  [4,16,-9.239,0,3.827,-10,0,0,-9,0,0,-8.3151,0,3.4443],
// 4 16 -10 0 0 -9.239 0 -3.827 -8.3151 0 -3.4443 -9 0 0
  [4,16,-10,0,0,-9.239,0,-3.827,-8.3151,0,-3.4443,-9,0,0],
// 4 16 -9.239 0 -3.827 -7.071 0 -7.071 -6.3639 0 -6.3639 -8.3151 0 -3.4443
  [4,16,-9.239,0,-3.827,-7.071,0,-7.071,-6.3639,0,-6.3639,-8.3151,0,-3.4443],
// 4 16 -7.071 0 -7.071 -3.827 0 -9.239 -3.4443 0 -8.3151 -6.3639 0 -6.3639
  [4,16,-7.071,0,-7.071,-3.827,0,-9.239,-3.4443,0,-8.3151,-6.3639,0,-6.3639],
// 4 16 -3.827 0 -9.239 0 0 -10 0 0 -9 -3.4443 0 -8.3151
  [4,16,-3.827,0,-9.239,0,0,-10,0,0,-9,-3.4443,0,-8.3151],
// 4 16 0 0 -10 3.827 0 -9.239 3.4443 0 -8.3151 0 0 -9
  [4,16,0,0,-10,3.827,0,-9.239,3.4443,0,-8.3151,0,0,-9],
// 4 16 3.827 0 -9.239 7.071 0 -7.071 6.3639 0 -6.3639 3.4443 0 -8.3151
  [4,16,3.827,0,-9.239,7.071,0,-7.071,6.3639,0,-6.3639,3.4443,0,-8.3151],
// 4 16 7.071 0 -7.071 9.239 0 -3.827 8.3151 0 -3.4443 6.3639 0 -6.3639
  [4,16,7.071,0,-7.071,9.239,0,-3.827,8.3151,0,-3.4443,6.3639,0,-6.3639],
// 4 16 9.239 0 -3.827 10 0 0 9 0 0 8.3151 0 -3.4443
  [4,16,9.239,0,-3.827,10,0,0,9,0,0,8.3151,0,-3.4443],
// 0 // Build by LDPartEditor (PrimGen 2.X)
];
module ldraw_lib__4_4ring9(step=0, col=false, unit=2/5, alt=false, line=0.2, solid=!$preview)
    makepoly(ldraw_lib__4_4ring9(), step=step, col=col, unit=unit, alt=alt, line=line, solid=solid);
ldraw_lib__4_4ring9(line=0.2);
// file: s/98138s01.scad
use <../../lib.scad>
use <../../p/4-4ring9.scad>
use <98138s02.scad>
function ldraw_lib__s__98138s01() = [
// 0 ~Tile  1 x  1 Round with Groove with Partial Top Face
// 0 Name: s\98138s01.dat
// 0 Author: Magnus Forsberg [MagFors]
// 0 !LDRAW_ORG Subpart UPDATE 2020-01
// 0 !LICENSE Licensed under CC BY 4.0 : see CAreadme.txt
// 
// 0 BFC CERTIFY CCW
  [0,"BFC","CERTIFY"],
  [0,"BFC","CCW"],
// 
// 0 !HISTORY 2011-12-29 [PTadmin] Official Update 2011-02
// 0 !HISTORY 2016-06-17 [MagFors] Reduced the rounded edge to 0.5 ldu
// 0 !HISTORY 2016-12-31 [PTadmin] Official Update 2016-01
// 0 !HISTORY 2019-06-17 [MagFors] Removed the rounded edge
// 0 !HISTORY 2019-07-19 [MagFors] Subfiled without top surface
// 0 !HISTORY 2020-06-28 [PTadmin] Official Update 2020-01
// 
// 
// 1 16 0 0 0 1 0 0 0 1 0 0 0 1 s\98138s02.dat
  [1,16,0,0,0,1,0,0,0,1,0,0,0,1, ldraw_lib__s__98138s02()],
// 1 16 0 0 0 1 0 0 0 1 0 0 0 1 4-4ring9.dat
  [1,16,0,0,0,1,0,0,0,1,0,0,0,1, ldraw_lib__4_4ring9()],
];
module ldraw_lib__s__98138s01(step=0, col=false, unit=2/5, alt=false, line=0.2, solid=!$preview)
    makepoly(ldraw_lib__s__98138s01(), step=step, col=col, unit=unit, alt=alt, line=line, solid=solid);
ldraw_lib__s__98138s01(line=0.2);
// file: ../p/1-8chrd.scad
use <../lib.scad>
function ldraw_lib__1_8chrd() = [
// 0 Chord 0.125
// 0 Name: 1-8chrd.dat
// 0 Author: Orion Pobursky [OrionP]
// 0 !LDRAW_ORG Primitive UPDATE 2023-05
// 0 !LICENSE Licensed under CC BY 4.0 : see CAreadme.txt
// 
// 0 BFC CERTIFY CCW
  [0,"BFC","CERTIFY"],
  [0,"BFC","CCW"],
// 
// 0 !HISTORY 2004-04-22 [PTadmin] Official Update 2004-02
// 0 !HISTORY 2007-06-22 [PTadmin] Header formatted for Contributor Agreement
// 0 !HISTORY 2008-07-01 [PTadmin] Official Update 2008-01
// 0 !HISTORY 2023-10-27 [OrionP] Rebuilt with PrimGen2, original author westrate
// 0 !HISTORY 2023-10-31 [OrionP] Official Update 2023-05
// 
// 3 16 1 0 0 0.9239 0 0.3827 0.7071 0 0.7071
  [3,16,1,0,0,0.9239,0,0.3827,0.7071,0,0.7071],
];
module ldraw_lib__1_8chrd(step=0, col=false, unit=2/5, alt=false, line=0.2, solid=!$preview)
    makepoly(ldraw_lib__1_8chrd(), step=step, col=col, unit=unit, alt=alt, line=line, solid=solid);
ldraw_lib__1_8chrd(line=0.2);
// file: ../p/1-4ndis.scad
use <../lib.scad>
function ldraw_lib__1_4ndis() = [
// 0 Disc Negative 0.25
// 0 Name: 1-4ndis.dat
// 0 Author: James Jessiman
// 0 !LDRAW_ORG Primitive UPDATE 2012-01
// 0 !LICENSE Licensed under CC BY 4.0 : see CAreadme.txt
// 
// 0 BFC CERTIFY CCW
  [0,"BFC","CERTIFY"],
  [0,"BFC","CCW"],
// 
// 0 !HISTORY 2002-03-23 [sbliss] Added BFC Statement
// 0 !HISTORY 2002-04-25 [PTadmin] Official Update 2002-02
// 0 !HISTORY 2007-06-22 [PTadmin] Header formatted for Contributor Agreement
// 0 !HISTORY 2008-07-01 [PTadmin] Official Update 2008-01
// 0 !HISTORY 2012-02-16 [Philo] Changed to CCW
// 0 !HISTORY 2012-03-30 [PTadmin] Official Update 2012-01
// 
// 
// 3 16 0.9239 0 0.3827 1 0 0 1 0 1
  [3,16,0.9239,0,0.3827,1,0,0,1,0,1],
// 3 16 0.7071 0 0.7071 0.9239 0 0.3827 1 0 1
  [3,16,0.7071,0,0.7071,0.9239,0,0.3827,1,0,1],
// 3 16 0.3827 0 0.9239 0.7071 0 0.7071 1 0 1
  [3,16,0.3827,0,0.9239,0.7071,0,0.7071,1,0,1],
// 3 16 0 0 1 0.3827 0 0.9239 1 0 1
  [3,16,0,0,1,0.3827,0,0.9239,1,0,1],
];
module ldraw_lib__1_4ndis(step=0, col=false, unit=2/5, alt=false, line=0.2, solid=!$preview)
    makepoly(ldraw_lib__1_4ndis(), step=step, col=col, unit=unit, alt=alt, line=line, solid=solid);
ldraw_lib__1_4ndis(line=0.2);
// file: ../p/1-4disc.scad
use <../lib.scad>
function ldraw_lib__1_4disc() = [
// 0 Disc 0.25
// 0 Name: 1-4disc.dat
// 0 Author: James Jessiman
// 0 !LDRAW_ORG Primitive UPDATE 2002-02
// 0 !LICENSE Licensed under CC BY 4.0 : see CAreadme.txt
// 
// 0 BFC CERTIFY CCW
  [0,"BFC","CERTIFY"],
  [0,"BFC","CCW"],
// 
// 0 !HISTORY 2002-03-23 [sbliss] Added BFC statement.
// 0 !HISTORY 2002-04-25 [PTadmin] Official Update 2002-02
// 0 !HISTORY 2007-06-22 [PTadmin] Header formatted for Contributor Agreement
// 0 !HISTORY 2008-07-01 [PTadmin] Official Update 2008-01
// 
// 
// 3 16 0 0 0 1 0 0 0.9239 0 0.3827
  [3,16,0,0,0,1,0,0,0.9239,0,0.3827],
// 3 16 0 0 0 0.9239 0 0.3827 0.7071 0 0.7071
  [3,16,0,0,0,0.9239,0,0.3827,0.7071,0,0.7071],
// 3 16 0 0 0 0.7071 0 0.7071 0.3827 0 0.9239
  [3,16,0,0,0,0.7071,0,0.7071,0.3827,0,0.9239],
// 3 16 0 0 0 0.3827 0 0.9239 0 0 1
  [3,16,0,0,0,0.3827,0,0.9239,0,0,1],
// 0
];
module ldraw_lib__1_4disc(step=0, col=false, unit=2/5, alt=false, line=0.2, solid=!$preview)
    makepoly(ldraw_lib__1_4disc(), step=step, col=col, unit=unit, alt=alt, line=line, solid=solid);
ldraw_lib__1_4disc(line=0.2);
// main file
use <../lib.scad>
use <../p/1-4disc.scad>
use <../p/1-4ndis.scad>
use <../p/1-8chrd.scad>
use <s/98138s01.scad>
function ldraw_lib__98138pt5() = [
// 0 Tile  1 x  1 Round with White Quarter Circles Pattern
// 0 Name: 98138pt5.dat
// 0 Author: Rene Rechthaler [Blechtaler]
// 0 !LDRAW_ORG Part UPDATE 2023-05
// 0 !LICENSE Licensed under CC BY 4.0 : see CAreadme.txt
// 
// 0 BFC CERTIFY CCW
  [0,"BFC","CERTIFY"],
  [0,"BFC","CCW"],
// 
// 0 !KEYWORDS Bricklink 98138pb383, Fiducial Marker, Mars Rover, NASA
// 0 !KEYWORDS Perseverance, Rebrickable 98138pr0361, Set 42158
// 
// 0 !HISTORY 2023-10-31 [OrionP] Official Update 2023-05
// 
// 1 16 0 0 0 1 0 0 0 1 0 0 0 1 s\98138s01.dat
  [1,16,0,0,0,1,0,0,0,1,0,0,0,1, ldraw_lib__s__98138s01()],
// 
// 1 16 0 0 0 5 0 0 0 1 0 0 0 5 1-4disc.dat
  [1,16,0,0,0,5,0,0,0,1,0,0,0,5, ldraw_lib__1_4disc()],
// 1 15 0 0 0 5 0 0 0 1 0 0 0 5 1-4ndis.dat
  [1,15,0,0,0,5,0,0,0,1,0,0,0,5, ldraw_lib__1_4ndis()],
// 1 15 0 0 0 9 0 0 0 1 0 0 0 9 1-8chrd.dat
  [1,15,0,0,0,9,0,0,0,1,0,0,0,9, ldraw_lib__1_8chrd()],
// 1 15 0 0 0 0 0 9 0 1 0 9 0 0 1-8chrd.dat
  [1,15,0,0,0,0,0,9,0,1,0,9,0,0, ldraw_lib__1_8chrd()],
// 4 15 5 0 5 5 0 0 9 0 0 6.3639 0 6.3639
  [4,15,5,0,5,5,0,0,9,0,0,6.3639,0,6.3639],
// 4 15 6.3639 0 6.3639 0 0 9 0 0 5 5 0 5
  [4,15,6.3639,0,6.3639,0,0,9,0,0,5,5,0,5],
// 1 15 0 0 0 -5 0 0 0 1 0 0 0 5 1-4disc.dat
  [1,15,0,0,0,-5,0,0,0,1,0,0,0,5, ldraw_lib__1_4disc()],
// 1 16 0 0 0 -5 0 0 0 1 0 0 0 5 1-4ndis.dat
  [1,16,0,0,0,-5,0,0,0,1,0,0,0,5, ldraw_lib__1_4ndis()],
// 1 16 0 0 0 -9 0 0 0 1 0 0 0 9 1-8chrd.dat
  [1,16,0,0,0,-9,0,0,0,1,0,0,0,9, ldraw_lib__1_8chrd()],
// 1 16 0 0 0 0 0 -9 0 1 0 9 0 0 1-8chrd.dat
  [1,16,0,0,0,0,0,-9,0,1,0,9,0,0, ldraw_lib__1_8chrd()],
// 4 16 -9 0 0 -5 0 0 -5 0 5 -6.3639 0 6.3639
  [4,16,-9,0,0,-5,0,0,-5,0,5,-6.3639,0,6.3639],
// 4 16 0 0 5 0 0 9 -6.3639 0 6.3639 -5 0 5
  [4,16,0,0,5,0,0,9,-6.3639,0,6.3639,-5,0,5],
// 1 16 0 0 0 -5 0 0 0 1 0 0 0 -5 1-4disc.dat
  [1,16,0,0,0,-5,0,0,0,1,0,0,0,-5, ldraw_lib__1_4disc()],
// 1 15 0 0 0 -5 0 0 0 1 0 0 0 -5 1-4ndis.dat
  [1,15,0,0,0,-5,0,0,0,1,0,0,0,-5, ldraw_lib__1_4ndis()],
// 1 15 0 0 0 -9 0 0 0 1 0 0 0 -9 1-8chrd.dat
  [1,15,0,0,0,-9,0,0,0,1,0,0,0,-9, ldraw_lib__1_8chrd()],
// 1 15 0 0 0 0 0 -9 0 1 0 -9 0 0 1-8chrd.dat
  [1,15,0,0,0,0,0,-9,0,1,0,-9,0,0, ldraw_lib__1_8chrd()],
// 4 15 -5 0 -5 -5 0 0 -9 0 0 -6.3639 0 -6.3639
  [4,15,-5,0,-5,-5,0,0,-9,0,0,-6.3639,0,-6.3639],
// 4 15 -6.3639 0 -6.3639 0 0 -9 0 0 -5 -5 0 -5
  [4,15,-6.3639,0,-6.3639,0,0,-9,0,0,-5,-5,0,-5],
// 1 15 0 0 0 5 0 0 0 1 0 0 0 -5 1-4disc.dat
  [1,15,0,0,0,5,0,0,0,1,0,0,0,-5, ldraw_lib__1_4disc()],
// 1 16 0 0 0 5 0 0 0 1 0 0 0 -5 1-4ndis.dat
  [1,16,0,0,0,5,0,0,0,1,0,0,0,-5, ldraw_lib__1_4ndis()],
// 1 16 0 0 0 9 0 0 0 1 0 0 0 -9 1-8chrd.dat
  [1,16,0,0,0,9,0,0,0,1,0,0,0,-9, ldraw_lib__1_8chrd()],
// 1 16 0 0 0 0 0 9 0 1 0 -9 0 0 1-8chrd.dat
  [1,16,0,0,0,0,0,9,0,1,0,-9,0,0, ldraw_lib__1_8chrd()],
// 4 16 9 0 0 5 0 0 5 0 -5 6.3639 0 -6.3639
  [4,16,9,0,0,5,0,0,5,0,-5,6.3639,0,-6.3639],
// 4 16 0 0 -5 0 0 -9 6.3639 0 -6.3639 5 0 -5
  [4,16,0,0,-5,0,0,-9,6.3639,0,-6.3639,5,0,-5],
];
module ldraw_lib__98138pt5(step=0, col=false, unit=2/5, alt=false, line=0.2, solid=!$preview)
    makepoly(ldraw_lib__98138pt5(), step=step, col=col, unit=unit, alt=alt, line=line, solid=solid);
ldraw_lib__98138pt5(line=0.2);
